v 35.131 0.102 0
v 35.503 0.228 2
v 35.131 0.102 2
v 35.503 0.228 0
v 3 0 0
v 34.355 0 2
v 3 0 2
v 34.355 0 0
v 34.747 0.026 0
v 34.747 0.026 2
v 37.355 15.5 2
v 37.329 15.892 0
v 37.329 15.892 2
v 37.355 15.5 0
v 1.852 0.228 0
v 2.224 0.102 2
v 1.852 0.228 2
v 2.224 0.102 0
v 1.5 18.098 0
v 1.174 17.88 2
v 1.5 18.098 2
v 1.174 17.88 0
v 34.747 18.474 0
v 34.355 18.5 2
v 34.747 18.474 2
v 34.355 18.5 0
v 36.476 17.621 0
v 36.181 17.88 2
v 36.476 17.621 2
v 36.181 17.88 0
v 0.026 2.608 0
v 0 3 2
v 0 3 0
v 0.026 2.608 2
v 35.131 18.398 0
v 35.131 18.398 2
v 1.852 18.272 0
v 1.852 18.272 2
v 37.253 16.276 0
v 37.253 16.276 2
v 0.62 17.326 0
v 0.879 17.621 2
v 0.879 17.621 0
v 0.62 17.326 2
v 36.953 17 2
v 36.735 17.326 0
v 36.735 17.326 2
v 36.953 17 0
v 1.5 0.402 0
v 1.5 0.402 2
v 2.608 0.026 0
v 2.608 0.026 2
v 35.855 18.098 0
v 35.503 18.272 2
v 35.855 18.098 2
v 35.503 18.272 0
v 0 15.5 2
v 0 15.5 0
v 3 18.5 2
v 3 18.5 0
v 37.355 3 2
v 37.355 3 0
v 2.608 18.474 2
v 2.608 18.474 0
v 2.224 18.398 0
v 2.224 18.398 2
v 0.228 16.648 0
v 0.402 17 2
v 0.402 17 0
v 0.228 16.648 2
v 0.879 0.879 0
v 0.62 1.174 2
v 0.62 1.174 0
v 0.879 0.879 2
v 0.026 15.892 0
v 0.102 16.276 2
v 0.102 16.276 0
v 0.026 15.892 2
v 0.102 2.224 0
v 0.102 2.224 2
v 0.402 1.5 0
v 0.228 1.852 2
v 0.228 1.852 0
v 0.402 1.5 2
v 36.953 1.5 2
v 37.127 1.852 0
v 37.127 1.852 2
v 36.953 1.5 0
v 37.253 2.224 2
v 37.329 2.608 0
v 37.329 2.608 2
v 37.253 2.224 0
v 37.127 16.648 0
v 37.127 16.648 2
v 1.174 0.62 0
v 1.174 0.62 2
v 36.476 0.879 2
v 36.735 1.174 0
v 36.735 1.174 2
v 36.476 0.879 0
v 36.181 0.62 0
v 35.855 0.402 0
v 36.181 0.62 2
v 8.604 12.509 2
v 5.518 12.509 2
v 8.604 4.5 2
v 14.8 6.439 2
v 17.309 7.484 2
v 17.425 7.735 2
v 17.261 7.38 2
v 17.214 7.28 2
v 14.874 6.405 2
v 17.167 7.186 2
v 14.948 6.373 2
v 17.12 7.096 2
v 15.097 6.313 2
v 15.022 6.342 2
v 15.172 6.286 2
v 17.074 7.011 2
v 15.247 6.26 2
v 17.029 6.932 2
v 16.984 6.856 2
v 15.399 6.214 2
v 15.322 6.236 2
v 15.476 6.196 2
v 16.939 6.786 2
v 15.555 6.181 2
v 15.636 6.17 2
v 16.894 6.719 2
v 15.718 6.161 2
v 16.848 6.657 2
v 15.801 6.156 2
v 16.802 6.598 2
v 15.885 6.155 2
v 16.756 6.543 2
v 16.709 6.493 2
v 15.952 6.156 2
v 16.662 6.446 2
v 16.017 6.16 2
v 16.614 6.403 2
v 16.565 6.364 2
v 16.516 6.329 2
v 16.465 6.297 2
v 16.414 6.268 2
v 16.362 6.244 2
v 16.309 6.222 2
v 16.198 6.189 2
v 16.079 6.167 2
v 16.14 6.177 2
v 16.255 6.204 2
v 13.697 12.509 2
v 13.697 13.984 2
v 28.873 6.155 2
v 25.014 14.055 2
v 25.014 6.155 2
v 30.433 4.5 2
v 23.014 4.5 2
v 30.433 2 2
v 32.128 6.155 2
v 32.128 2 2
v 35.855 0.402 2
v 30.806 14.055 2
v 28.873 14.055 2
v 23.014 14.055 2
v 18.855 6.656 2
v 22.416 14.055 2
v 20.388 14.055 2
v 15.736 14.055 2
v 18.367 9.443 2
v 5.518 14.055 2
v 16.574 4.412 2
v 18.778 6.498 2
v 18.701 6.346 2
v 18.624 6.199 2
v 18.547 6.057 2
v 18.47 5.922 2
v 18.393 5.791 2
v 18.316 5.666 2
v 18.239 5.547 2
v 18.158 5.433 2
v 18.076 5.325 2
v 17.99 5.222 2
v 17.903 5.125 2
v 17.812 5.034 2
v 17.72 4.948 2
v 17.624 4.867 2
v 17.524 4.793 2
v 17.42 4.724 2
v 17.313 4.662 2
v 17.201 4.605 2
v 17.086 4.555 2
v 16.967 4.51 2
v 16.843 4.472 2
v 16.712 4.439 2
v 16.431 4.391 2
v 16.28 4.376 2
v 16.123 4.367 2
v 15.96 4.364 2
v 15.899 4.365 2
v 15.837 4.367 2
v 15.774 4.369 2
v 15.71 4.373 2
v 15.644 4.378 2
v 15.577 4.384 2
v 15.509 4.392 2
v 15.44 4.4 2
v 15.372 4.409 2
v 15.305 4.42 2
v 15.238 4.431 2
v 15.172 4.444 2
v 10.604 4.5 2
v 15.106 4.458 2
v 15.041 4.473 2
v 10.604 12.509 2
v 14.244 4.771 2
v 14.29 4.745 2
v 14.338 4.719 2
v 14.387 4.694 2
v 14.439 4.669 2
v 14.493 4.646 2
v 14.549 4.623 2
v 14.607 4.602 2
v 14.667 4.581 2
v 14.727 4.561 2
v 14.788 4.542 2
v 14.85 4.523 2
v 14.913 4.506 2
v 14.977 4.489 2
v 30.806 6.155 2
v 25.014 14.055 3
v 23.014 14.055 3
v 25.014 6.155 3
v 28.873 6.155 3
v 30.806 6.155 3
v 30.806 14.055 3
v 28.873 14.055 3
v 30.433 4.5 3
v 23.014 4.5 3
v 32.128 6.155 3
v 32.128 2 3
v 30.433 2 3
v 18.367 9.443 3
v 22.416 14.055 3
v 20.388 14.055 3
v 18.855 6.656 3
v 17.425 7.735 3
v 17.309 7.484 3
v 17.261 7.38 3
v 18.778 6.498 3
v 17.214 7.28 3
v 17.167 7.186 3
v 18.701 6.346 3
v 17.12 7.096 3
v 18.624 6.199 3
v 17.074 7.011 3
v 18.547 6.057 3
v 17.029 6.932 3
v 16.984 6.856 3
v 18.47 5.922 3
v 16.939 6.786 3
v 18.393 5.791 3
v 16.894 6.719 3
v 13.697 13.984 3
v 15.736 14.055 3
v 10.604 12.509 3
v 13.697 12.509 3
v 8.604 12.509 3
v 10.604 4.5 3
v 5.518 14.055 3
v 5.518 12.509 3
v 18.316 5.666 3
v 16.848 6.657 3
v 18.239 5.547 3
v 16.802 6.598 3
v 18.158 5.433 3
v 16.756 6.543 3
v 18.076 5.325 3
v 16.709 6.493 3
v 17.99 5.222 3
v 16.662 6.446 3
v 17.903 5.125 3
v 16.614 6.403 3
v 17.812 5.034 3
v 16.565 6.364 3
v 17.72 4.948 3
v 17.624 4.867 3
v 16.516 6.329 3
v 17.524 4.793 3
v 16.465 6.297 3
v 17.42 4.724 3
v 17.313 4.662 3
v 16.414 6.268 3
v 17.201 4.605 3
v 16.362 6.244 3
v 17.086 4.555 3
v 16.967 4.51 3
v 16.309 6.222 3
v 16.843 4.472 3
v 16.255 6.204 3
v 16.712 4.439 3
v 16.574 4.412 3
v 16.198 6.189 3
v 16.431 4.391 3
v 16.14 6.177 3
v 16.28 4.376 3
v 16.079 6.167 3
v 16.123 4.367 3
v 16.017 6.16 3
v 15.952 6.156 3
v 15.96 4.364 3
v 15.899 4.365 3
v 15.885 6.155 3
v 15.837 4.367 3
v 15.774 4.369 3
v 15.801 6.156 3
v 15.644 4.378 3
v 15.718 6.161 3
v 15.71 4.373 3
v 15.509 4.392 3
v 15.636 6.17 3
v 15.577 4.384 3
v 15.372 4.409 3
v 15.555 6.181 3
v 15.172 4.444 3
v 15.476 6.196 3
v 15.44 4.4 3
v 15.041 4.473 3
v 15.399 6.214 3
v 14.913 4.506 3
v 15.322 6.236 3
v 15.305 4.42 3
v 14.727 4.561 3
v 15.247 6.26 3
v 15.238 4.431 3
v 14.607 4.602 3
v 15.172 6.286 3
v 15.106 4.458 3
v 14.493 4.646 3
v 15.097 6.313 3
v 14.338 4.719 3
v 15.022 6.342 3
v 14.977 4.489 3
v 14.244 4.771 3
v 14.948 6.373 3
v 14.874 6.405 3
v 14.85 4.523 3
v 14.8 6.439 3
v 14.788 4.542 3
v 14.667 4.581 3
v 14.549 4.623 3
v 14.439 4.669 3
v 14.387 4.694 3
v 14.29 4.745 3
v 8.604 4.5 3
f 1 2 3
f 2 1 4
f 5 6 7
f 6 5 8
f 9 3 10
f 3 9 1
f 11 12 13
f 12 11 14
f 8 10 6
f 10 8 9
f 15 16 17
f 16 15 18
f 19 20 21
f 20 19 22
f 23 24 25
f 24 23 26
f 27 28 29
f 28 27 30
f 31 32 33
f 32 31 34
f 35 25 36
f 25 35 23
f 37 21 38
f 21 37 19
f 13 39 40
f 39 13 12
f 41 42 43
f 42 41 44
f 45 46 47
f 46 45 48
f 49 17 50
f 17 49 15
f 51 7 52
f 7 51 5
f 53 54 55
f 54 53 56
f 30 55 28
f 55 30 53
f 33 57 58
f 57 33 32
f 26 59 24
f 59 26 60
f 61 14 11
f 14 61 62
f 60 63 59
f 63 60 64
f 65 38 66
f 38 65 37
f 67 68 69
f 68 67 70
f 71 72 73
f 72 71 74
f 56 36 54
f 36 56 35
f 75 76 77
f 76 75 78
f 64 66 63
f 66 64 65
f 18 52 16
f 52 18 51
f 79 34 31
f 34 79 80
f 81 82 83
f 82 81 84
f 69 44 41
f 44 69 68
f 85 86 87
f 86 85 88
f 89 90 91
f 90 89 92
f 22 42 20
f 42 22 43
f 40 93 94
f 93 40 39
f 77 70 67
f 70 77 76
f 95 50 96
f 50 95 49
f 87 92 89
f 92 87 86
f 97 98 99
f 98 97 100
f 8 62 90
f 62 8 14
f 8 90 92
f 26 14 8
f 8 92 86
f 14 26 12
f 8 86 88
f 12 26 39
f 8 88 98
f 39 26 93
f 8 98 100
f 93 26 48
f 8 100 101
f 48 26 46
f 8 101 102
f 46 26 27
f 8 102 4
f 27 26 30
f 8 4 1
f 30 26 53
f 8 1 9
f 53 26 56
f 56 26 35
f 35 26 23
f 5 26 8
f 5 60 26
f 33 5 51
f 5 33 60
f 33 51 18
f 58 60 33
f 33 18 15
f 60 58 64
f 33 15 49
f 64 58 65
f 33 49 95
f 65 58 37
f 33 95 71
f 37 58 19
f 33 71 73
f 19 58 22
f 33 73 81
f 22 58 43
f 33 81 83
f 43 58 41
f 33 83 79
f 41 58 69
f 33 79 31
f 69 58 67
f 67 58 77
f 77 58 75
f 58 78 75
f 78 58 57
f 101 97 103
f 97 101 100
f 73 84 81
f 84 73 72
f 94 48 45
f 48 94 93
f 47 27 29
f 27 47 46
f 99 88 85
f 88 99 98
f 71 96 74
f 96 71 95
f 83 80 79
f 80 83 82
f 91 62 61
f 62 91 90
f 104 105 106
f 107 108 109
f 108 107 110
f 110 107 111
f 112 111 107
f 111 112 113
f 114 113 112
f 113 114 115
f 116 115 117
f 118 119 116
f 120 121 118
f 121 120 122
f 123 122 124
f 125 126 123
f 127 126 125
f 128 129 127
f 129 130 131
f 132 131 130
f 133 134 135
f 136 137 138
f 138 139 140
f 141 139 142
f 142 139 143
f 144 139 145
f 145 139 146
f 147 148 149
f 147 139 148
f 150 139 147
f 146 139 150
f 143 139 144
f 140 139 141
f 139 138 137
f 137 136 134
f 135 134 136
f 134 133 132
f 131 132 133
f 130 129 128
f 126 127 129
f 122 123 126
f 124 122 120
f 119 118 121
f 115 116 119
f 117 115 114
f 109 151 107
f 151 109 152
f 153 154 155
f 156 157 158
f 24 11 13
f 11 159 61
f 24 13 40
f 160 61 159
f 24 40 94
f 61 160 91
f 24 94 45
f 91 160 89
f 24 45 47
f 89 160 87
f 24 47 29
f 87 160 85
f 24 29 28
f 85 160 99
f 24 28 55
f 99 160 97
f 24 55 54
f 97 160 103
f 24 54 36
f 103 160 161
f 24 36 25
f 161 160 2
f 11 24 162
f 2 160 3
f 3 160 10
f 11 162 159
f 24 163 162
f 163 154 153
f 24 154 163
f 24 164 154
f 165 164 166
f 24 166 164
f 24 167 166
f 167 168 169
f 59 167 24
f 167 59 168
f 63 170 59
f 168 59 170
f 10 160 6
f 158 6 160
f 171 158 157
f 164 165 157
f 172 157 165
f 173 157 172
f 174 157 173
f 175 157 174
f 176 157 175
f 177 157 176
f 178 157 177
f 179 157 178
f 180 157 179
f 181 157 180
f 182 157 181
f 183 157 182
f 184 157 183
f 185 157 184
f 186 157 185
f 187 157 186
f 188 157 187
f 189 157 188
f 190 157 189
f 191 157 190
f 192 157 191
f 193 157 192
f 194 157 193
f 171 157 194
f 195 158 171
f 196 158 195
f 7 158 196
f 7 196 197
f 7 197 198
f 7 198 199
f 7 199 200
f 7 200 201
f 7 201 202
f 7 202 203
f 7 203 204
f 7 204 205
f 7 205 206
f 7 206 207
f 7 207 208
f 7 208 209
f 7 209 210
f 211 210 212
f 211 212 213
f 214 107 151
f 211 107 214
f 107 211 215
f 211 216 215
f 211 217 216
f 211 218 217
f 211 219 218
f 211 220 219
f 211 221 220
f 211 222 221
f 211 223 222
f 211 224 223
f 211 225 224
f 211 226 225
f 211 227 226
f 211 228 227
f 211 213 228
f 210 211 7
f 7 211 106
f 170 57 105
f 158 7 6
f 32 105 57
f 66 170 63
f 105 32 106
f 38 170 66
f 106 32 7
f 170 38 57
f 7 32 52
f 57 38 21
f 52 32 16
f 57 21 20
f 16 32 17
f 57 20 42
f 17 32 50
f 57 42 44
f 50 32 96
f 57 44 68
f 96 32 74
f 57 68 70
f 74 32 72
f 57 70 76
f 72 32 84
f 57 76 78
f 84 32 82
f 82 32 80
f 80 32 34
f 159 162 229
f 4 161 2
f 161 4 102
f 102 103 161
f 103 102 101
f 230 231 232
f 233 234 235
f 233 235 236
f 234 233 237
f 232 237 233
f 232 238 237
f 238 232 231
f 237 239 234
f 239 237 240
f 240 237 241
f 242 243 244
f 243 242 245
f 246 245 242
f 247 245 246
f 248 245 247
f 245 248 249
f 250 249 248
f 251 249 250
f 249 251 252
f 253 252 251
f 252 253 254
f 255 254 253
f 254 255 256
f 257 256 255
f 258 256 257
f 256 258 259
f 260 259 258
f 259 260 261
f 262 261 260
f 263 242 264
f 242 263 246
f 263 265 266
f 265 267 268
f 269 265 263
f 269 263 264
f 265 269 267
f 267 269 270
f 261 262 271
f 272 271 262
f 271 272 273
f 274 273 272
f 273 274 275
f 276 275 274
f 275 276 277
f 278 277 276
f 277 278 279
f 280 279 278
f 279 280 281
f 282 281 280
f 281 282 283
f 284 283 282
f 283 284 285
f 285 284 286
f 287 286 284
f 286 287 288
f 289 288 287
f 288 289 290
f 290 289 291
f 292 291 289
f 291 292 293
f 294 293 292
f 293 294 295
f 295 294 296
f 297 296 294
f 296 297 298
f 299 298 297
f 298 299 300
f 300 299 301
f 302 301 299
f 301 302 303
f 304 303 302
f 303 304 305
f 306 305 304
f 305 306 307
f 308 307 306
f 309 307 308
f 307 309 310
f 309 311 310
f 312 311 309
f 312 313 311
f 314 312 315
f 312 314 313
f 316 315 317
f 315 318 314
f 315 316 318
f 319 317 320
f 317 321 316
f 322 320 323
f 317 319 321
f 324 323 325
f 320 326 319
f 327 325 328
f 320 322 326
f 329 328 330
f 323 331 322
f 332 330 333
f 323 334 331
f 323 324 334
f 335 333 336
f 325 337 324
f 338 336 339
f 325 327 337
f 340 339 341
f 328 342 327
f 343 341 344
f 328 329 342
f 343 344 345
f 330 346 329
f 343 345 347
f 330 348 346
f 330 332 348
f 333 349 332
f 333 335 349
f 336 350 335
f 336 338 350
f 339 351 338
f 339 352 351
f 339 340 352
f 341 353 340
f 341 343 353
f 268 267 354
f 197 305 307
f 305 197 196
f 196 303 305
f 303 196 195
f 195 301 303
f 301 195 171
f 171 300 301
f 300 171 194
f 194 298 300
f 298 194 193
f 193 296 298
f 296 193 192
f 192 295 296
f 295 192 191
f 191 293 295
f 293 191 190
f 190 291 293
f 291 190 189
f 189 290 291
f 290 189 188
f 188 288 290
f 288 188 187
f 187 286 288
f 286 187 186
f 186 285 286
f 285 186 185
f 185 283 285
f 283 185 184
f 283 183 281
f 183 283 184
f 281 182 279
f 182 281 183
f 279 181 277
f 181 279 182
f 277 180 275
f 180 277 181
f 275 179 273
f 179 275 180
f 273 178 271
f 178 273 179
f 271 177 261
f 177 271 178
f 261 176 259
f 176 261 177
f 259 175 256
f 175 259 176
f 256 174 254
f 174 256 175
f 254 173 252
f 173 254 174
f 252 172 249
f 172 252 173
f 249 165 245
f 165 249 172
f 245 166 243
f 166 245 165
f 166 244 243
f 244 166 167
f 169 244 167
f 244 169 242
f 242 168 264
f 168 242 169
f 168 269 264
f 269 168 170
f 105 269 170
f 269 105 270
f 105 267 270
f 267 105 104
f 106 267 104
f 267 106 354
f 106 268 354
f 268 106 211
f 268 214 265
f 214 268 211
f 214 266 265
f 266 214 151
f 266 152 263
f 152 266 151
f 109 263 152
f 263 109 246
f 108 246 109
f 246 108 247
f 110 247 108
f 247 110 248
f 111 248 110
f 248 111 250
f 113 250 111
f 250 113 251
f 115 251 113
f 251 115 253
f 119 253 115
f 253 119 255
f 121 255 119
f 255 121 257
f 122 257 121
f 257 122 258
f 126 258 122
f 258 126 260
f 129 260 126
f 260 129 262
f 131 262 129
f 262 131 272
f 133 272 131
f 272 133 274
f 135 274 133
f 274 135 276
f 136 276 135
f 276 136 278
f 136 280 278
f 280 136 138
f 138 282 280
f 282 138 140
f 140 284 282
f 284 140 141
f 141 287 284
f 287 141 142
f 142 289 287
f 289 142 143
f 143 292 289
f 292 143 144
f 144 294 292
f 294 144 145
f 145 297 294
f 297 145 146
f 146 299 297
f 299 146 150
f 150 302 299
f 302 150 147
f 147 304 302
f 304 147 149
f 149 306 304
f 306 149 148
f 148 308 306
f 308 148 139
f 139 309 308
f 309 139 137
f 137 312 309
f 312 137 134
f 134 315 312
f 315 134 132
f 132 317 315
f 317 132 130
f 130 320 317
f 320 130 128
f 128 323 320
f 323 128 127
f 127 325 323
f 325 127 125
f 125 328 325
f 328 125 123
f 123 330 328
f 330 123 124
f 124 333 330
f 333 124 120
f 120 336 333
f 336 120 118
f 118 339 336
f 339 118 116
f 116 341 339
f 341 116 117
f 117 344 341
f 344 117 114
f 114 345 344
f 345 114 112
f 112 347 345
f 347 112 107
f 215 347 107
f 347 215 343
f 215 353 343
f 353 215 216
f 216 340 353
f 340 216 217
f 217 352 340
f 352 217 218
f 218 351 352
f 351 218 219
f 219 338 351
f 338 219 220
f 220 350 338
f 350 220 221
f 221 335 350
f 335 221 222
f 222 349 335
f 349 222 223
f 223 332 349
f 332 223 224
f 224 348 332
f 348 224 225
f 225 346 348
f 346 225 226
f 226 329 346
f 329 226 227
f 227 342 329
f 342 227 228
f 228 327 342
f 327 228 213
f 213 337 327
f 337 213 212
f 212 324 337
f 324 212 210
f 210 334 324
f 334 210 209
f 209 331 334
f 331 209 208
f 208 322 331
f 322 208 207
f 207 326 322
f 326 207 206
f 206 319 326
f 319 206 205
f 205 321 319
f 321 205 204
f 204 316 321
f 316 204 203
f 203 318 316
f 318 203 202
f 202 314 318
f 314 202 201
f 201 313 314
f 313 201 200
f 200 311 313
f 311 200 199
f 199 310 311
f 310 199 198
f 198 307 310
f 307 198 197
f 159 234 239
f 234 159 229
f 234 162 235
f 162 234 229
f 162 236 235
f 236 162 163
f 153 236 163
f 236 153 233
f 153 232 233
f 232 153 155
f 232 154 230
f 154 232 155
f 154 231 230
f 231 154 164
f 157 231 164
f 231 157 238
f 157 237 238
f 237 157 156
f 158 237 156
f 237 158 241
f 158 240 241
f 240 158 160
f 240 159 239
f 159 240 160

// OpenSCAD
// Табличка / бирка с текстом (B24). Параметры ниже переопределяет сервер: openscad -D text="…" ...
// Все размеры в мм. Табличка лежит на столе: длина по X, высота по Y, толщина по Z.
// Левый нижний угол — в начале координат.

text = "ТУЦ";           // надпись (первая строка)
text2 = "";             // вторая строка, "" — её нет
font_size = 10;         // размер шрифта = высота заглавной буквы
font = "sans";          // "sans" | "serif" | "mono"
bold = true;            // жирное начертание
style = "raised";       // "raised" — выпуклый текст, "engraved" — углублённый
text_h = 1;             // высота выпуклого / глубина углублённого текста
thickness = 2;          // толщина основания
width = 0;              // ширина таблички, 0 — по тексту
height = 0;             // высота таблички, 0 — по тексту
margin = 4;             // поля между текстом и краем
corner_r = 3;           // скругление углов
frame = false;          // выпуклая рамка по периметру
hole = "none";          // "none" | "left" | "both"
hole_d = 4;             // диаметр отверстий

$fn = 48;               // гладкость окружностей
eps = 0.01;             // небольшой запас, чтобы вырезы выходили за край детали

// --- шрифт -------------------------------------------------------------------------------
// Шрифты Liberation стоят в worker (fonts-liberation); в них есть кириллица.
// Если шрифта нет, OpenSCAD подставит похожий и напишет предупреждение — модель построится.
family = font == "serif" ? "Liberation Serif" : font == "mono" ? "Liberation Mono" : "Liberation Sans";
font_spec = str(family, ":style=", bold ? "Bold" : "Regular");

// --- оценка размеров текста --------------------------------------------------------------
// OpenSCAD (версия из Debian) не умеет измерять текст, поэтому ширину строки прикидываем
// по буквам: у каждой — примерная ширина в долях размера шрифта (замерено по Liberation).
// Оценка с небольшим запасом: лучше табличка чуть шире, чем обрезанная буква. На всякий
// случай текст ещё и обрезается по площадке под него (text_clipped) — модель не сломается.
wide_upper = "ШЩЖЮЫФМДWM";          // самые широкие заглавные
wide_lower = "шщжюыфмдmw—";         // широкие строчные и длинное тире
narrow = " iljtfIі!.,:;'|-()[]";    // узкие знаки и пробел
descenders = "gjpqyдруфцщ,;";       // то, что свешивается под базовую линию
function is_in(ch, set) = len(search(ch, set)) > 0;
function is_upper(ch) = (ch >= "A" && ch <= "Z") || (ch >= "А" && ch <= "Я") || ch == "Ё";
function char_k(ch) =
    font == "mono" ? 0.82
    : is_in(ch, wide_upper) ? (font == "serif" ? 1.45 : 1.3)
    : is_in(ch, wide_lower) ? 1.1
    : is_in(ch, narrow) ? 0.4
    : is_upper(ch) ? 0.95
    : 0.75;
bold_k = bold ? 1 : 0.92;  // обычное начертание уже жирного
function line_w(s) = len(s) == 0 ? 0 : font_size * bold_k * 1.03 * (
    [for (i = [0 : 1 : len(s) - 1]) char_k(s[i])] * [for (i = [0 : 1 : len(s) - 1]) 1]
);
function has_descender(s) = len([for (i = [0 : 1 : len(s) - 1]) if (is_in(s[i], descenders)) 1]) > 0;

lines = text2 == "" ? [text] : [text, text2];
n_lines = len(lines);
block_w = max([for (s = lines) line_w(s)]);
// По вертикали: над базовой линией — размер шрифта (заглавные и б, й), под ней — хвосты
// у, р, д (0,3 размера), если такие буквы есть. Между строками — просвет 0,25 размера.
ascent = 1.0 * font_size;
function descent(s) = (has_descender(s) ? 0.3 : 0.05) * font_size;
gap = 0.25 * font_size;
line_hs = [for (s = lines) ascent + descent(s)];
block_h = (line_hs * [for (s = lines) 1]) + (n_lines - 1) * gap;
// Базовая линия i-й строки, если верх блока текста — y = 0.
function baseline_y(i) = -(ascent + (i > 0 ? line_hs[0] + gap : 0));

// --- площадка таблички -------------------------------------------------------------------
// Слева/справа от текста — поля; там, где отверстие, вместо поля — место под него
// (диаметр + по 2,5 мм стенки с каждой стороны).
hole_pad = hole_d + 5;
pad_left = hole == "none" ? margin : hole_pad;
pad_right = hole == "both" ? hole_pad : margin;
// Автоматический размер не больше стола принтера (250 × 150 — как максимумы в editor.yaml):
// слишком длинная надпись не растянет табличку, а уменьшится.
max_w = 250;
max_h = 150;
plate_w = width > 0 ? max(width, pad_left + pad_right + 2) : min(max_w, pad_left + block_w + pad_right);
// Площадка под текст: между полями. Текст центрируется в ней; если заданная ширина или
// высота таблички меньше, чем нужно тексту, буквы пропорционально уменьшаются.
area_w = plate_w - pad_left - pad_right;
scale_w = block_w > 0 ? min(1, area_w / block_w) : 1;   // насколько ужать по ширине
// Автоматическая высота — под текст уже ужатый по ширине, чтобы не оставалось пустого места.
plate_h = height > 0 ? max(height, 2 * margin + 2) : min(max_h, 2 * margin + block_h * scale_w);
area_h = plate_h - 2 * margin;
text_scale = min(scale_w, area_h / block_h);
r = min(corner_r, (min(plate_w, plate_h) - 1) / 2);  // скругление не больше половины стороны
area_cx = pad_left + area_w / 2;
area_cy = plate_h / 2;

module rounded_rect(w, h, rr) {
    if (rr > 0)
        offset(r = rr) offset(delta = -rr) square([w, h]);
    else
        square([w, h]);
}

// Контур текста в 2D: строки одна под другой, центр блока — в начале координат.
module text_2d() {
    scale(text_scale)
        translate([0, block_h / 2])
            for (i = [0 : 1 : n_lines - 1])
                translate([0, baseline_y(i)])
                    text(lines[i], size = font_size, font = font_spec, halign = "center", valign = "baseline");
}

// Текст, обрезанный по площадке плюс половина поля (на случай, если оценка промахнулась).
module text_clipped() {
    intersection() {
        translate([area_cx, area_cy]) text_2d();
        translate([pad_left - margin / 2, margin / 2]) square([area_w + margin, area_h + margin]);
    }
}

// --- детали --------------------------------------------------------------------------------
module base() {
    linear_extrude(thickness) rounded_rect(plate_w, plate_h, r);
}

module holes() {
    hd = min(hole_d, plate_h - 4);            // отверстие не шире таблички минус стенки
    if (hole != "none" && hd >= 1) {
        translate([2.5 + hd / 2, plate_h / 2, -eps]) cylinder(d = hd, h = thickness + 2 * eps);
        if (hole == "both")
            translate([plate_w - 2.5 - hd / 2, plate_h / 2, -eps]) cylinder(d = hd, h = thickness + 2 * eps);
    }
}

frame_w = 1.2;  // ширина рамки

module frame_3d() {
    translate([0, 0, thickness - eps])
        linear_extrude(text_h + eps)
            difference() {
                rounded_rect(plate_w, plate_h, r);
                translate([frame_w, frame_w]) rounded_rect(plate_w - 2 * frame_w, plate_h - 2 * frame_w, max(r - frame_w, 0));
            }
}

// --- сборка ------------------------------------------------------------------------------
difference() {
    union() {
        base();
        if (style == "raised")
            translate([0, 0, thickness - eps]) linear_extrude(text_h + eps) text_clipped();
        if (frame) frame_3d();
    }
    if (style == "engraved")
        translate([0, 0, thickness - text_h]) linear_extrude(text_h + eps) text_clipped();
    holes();
}
